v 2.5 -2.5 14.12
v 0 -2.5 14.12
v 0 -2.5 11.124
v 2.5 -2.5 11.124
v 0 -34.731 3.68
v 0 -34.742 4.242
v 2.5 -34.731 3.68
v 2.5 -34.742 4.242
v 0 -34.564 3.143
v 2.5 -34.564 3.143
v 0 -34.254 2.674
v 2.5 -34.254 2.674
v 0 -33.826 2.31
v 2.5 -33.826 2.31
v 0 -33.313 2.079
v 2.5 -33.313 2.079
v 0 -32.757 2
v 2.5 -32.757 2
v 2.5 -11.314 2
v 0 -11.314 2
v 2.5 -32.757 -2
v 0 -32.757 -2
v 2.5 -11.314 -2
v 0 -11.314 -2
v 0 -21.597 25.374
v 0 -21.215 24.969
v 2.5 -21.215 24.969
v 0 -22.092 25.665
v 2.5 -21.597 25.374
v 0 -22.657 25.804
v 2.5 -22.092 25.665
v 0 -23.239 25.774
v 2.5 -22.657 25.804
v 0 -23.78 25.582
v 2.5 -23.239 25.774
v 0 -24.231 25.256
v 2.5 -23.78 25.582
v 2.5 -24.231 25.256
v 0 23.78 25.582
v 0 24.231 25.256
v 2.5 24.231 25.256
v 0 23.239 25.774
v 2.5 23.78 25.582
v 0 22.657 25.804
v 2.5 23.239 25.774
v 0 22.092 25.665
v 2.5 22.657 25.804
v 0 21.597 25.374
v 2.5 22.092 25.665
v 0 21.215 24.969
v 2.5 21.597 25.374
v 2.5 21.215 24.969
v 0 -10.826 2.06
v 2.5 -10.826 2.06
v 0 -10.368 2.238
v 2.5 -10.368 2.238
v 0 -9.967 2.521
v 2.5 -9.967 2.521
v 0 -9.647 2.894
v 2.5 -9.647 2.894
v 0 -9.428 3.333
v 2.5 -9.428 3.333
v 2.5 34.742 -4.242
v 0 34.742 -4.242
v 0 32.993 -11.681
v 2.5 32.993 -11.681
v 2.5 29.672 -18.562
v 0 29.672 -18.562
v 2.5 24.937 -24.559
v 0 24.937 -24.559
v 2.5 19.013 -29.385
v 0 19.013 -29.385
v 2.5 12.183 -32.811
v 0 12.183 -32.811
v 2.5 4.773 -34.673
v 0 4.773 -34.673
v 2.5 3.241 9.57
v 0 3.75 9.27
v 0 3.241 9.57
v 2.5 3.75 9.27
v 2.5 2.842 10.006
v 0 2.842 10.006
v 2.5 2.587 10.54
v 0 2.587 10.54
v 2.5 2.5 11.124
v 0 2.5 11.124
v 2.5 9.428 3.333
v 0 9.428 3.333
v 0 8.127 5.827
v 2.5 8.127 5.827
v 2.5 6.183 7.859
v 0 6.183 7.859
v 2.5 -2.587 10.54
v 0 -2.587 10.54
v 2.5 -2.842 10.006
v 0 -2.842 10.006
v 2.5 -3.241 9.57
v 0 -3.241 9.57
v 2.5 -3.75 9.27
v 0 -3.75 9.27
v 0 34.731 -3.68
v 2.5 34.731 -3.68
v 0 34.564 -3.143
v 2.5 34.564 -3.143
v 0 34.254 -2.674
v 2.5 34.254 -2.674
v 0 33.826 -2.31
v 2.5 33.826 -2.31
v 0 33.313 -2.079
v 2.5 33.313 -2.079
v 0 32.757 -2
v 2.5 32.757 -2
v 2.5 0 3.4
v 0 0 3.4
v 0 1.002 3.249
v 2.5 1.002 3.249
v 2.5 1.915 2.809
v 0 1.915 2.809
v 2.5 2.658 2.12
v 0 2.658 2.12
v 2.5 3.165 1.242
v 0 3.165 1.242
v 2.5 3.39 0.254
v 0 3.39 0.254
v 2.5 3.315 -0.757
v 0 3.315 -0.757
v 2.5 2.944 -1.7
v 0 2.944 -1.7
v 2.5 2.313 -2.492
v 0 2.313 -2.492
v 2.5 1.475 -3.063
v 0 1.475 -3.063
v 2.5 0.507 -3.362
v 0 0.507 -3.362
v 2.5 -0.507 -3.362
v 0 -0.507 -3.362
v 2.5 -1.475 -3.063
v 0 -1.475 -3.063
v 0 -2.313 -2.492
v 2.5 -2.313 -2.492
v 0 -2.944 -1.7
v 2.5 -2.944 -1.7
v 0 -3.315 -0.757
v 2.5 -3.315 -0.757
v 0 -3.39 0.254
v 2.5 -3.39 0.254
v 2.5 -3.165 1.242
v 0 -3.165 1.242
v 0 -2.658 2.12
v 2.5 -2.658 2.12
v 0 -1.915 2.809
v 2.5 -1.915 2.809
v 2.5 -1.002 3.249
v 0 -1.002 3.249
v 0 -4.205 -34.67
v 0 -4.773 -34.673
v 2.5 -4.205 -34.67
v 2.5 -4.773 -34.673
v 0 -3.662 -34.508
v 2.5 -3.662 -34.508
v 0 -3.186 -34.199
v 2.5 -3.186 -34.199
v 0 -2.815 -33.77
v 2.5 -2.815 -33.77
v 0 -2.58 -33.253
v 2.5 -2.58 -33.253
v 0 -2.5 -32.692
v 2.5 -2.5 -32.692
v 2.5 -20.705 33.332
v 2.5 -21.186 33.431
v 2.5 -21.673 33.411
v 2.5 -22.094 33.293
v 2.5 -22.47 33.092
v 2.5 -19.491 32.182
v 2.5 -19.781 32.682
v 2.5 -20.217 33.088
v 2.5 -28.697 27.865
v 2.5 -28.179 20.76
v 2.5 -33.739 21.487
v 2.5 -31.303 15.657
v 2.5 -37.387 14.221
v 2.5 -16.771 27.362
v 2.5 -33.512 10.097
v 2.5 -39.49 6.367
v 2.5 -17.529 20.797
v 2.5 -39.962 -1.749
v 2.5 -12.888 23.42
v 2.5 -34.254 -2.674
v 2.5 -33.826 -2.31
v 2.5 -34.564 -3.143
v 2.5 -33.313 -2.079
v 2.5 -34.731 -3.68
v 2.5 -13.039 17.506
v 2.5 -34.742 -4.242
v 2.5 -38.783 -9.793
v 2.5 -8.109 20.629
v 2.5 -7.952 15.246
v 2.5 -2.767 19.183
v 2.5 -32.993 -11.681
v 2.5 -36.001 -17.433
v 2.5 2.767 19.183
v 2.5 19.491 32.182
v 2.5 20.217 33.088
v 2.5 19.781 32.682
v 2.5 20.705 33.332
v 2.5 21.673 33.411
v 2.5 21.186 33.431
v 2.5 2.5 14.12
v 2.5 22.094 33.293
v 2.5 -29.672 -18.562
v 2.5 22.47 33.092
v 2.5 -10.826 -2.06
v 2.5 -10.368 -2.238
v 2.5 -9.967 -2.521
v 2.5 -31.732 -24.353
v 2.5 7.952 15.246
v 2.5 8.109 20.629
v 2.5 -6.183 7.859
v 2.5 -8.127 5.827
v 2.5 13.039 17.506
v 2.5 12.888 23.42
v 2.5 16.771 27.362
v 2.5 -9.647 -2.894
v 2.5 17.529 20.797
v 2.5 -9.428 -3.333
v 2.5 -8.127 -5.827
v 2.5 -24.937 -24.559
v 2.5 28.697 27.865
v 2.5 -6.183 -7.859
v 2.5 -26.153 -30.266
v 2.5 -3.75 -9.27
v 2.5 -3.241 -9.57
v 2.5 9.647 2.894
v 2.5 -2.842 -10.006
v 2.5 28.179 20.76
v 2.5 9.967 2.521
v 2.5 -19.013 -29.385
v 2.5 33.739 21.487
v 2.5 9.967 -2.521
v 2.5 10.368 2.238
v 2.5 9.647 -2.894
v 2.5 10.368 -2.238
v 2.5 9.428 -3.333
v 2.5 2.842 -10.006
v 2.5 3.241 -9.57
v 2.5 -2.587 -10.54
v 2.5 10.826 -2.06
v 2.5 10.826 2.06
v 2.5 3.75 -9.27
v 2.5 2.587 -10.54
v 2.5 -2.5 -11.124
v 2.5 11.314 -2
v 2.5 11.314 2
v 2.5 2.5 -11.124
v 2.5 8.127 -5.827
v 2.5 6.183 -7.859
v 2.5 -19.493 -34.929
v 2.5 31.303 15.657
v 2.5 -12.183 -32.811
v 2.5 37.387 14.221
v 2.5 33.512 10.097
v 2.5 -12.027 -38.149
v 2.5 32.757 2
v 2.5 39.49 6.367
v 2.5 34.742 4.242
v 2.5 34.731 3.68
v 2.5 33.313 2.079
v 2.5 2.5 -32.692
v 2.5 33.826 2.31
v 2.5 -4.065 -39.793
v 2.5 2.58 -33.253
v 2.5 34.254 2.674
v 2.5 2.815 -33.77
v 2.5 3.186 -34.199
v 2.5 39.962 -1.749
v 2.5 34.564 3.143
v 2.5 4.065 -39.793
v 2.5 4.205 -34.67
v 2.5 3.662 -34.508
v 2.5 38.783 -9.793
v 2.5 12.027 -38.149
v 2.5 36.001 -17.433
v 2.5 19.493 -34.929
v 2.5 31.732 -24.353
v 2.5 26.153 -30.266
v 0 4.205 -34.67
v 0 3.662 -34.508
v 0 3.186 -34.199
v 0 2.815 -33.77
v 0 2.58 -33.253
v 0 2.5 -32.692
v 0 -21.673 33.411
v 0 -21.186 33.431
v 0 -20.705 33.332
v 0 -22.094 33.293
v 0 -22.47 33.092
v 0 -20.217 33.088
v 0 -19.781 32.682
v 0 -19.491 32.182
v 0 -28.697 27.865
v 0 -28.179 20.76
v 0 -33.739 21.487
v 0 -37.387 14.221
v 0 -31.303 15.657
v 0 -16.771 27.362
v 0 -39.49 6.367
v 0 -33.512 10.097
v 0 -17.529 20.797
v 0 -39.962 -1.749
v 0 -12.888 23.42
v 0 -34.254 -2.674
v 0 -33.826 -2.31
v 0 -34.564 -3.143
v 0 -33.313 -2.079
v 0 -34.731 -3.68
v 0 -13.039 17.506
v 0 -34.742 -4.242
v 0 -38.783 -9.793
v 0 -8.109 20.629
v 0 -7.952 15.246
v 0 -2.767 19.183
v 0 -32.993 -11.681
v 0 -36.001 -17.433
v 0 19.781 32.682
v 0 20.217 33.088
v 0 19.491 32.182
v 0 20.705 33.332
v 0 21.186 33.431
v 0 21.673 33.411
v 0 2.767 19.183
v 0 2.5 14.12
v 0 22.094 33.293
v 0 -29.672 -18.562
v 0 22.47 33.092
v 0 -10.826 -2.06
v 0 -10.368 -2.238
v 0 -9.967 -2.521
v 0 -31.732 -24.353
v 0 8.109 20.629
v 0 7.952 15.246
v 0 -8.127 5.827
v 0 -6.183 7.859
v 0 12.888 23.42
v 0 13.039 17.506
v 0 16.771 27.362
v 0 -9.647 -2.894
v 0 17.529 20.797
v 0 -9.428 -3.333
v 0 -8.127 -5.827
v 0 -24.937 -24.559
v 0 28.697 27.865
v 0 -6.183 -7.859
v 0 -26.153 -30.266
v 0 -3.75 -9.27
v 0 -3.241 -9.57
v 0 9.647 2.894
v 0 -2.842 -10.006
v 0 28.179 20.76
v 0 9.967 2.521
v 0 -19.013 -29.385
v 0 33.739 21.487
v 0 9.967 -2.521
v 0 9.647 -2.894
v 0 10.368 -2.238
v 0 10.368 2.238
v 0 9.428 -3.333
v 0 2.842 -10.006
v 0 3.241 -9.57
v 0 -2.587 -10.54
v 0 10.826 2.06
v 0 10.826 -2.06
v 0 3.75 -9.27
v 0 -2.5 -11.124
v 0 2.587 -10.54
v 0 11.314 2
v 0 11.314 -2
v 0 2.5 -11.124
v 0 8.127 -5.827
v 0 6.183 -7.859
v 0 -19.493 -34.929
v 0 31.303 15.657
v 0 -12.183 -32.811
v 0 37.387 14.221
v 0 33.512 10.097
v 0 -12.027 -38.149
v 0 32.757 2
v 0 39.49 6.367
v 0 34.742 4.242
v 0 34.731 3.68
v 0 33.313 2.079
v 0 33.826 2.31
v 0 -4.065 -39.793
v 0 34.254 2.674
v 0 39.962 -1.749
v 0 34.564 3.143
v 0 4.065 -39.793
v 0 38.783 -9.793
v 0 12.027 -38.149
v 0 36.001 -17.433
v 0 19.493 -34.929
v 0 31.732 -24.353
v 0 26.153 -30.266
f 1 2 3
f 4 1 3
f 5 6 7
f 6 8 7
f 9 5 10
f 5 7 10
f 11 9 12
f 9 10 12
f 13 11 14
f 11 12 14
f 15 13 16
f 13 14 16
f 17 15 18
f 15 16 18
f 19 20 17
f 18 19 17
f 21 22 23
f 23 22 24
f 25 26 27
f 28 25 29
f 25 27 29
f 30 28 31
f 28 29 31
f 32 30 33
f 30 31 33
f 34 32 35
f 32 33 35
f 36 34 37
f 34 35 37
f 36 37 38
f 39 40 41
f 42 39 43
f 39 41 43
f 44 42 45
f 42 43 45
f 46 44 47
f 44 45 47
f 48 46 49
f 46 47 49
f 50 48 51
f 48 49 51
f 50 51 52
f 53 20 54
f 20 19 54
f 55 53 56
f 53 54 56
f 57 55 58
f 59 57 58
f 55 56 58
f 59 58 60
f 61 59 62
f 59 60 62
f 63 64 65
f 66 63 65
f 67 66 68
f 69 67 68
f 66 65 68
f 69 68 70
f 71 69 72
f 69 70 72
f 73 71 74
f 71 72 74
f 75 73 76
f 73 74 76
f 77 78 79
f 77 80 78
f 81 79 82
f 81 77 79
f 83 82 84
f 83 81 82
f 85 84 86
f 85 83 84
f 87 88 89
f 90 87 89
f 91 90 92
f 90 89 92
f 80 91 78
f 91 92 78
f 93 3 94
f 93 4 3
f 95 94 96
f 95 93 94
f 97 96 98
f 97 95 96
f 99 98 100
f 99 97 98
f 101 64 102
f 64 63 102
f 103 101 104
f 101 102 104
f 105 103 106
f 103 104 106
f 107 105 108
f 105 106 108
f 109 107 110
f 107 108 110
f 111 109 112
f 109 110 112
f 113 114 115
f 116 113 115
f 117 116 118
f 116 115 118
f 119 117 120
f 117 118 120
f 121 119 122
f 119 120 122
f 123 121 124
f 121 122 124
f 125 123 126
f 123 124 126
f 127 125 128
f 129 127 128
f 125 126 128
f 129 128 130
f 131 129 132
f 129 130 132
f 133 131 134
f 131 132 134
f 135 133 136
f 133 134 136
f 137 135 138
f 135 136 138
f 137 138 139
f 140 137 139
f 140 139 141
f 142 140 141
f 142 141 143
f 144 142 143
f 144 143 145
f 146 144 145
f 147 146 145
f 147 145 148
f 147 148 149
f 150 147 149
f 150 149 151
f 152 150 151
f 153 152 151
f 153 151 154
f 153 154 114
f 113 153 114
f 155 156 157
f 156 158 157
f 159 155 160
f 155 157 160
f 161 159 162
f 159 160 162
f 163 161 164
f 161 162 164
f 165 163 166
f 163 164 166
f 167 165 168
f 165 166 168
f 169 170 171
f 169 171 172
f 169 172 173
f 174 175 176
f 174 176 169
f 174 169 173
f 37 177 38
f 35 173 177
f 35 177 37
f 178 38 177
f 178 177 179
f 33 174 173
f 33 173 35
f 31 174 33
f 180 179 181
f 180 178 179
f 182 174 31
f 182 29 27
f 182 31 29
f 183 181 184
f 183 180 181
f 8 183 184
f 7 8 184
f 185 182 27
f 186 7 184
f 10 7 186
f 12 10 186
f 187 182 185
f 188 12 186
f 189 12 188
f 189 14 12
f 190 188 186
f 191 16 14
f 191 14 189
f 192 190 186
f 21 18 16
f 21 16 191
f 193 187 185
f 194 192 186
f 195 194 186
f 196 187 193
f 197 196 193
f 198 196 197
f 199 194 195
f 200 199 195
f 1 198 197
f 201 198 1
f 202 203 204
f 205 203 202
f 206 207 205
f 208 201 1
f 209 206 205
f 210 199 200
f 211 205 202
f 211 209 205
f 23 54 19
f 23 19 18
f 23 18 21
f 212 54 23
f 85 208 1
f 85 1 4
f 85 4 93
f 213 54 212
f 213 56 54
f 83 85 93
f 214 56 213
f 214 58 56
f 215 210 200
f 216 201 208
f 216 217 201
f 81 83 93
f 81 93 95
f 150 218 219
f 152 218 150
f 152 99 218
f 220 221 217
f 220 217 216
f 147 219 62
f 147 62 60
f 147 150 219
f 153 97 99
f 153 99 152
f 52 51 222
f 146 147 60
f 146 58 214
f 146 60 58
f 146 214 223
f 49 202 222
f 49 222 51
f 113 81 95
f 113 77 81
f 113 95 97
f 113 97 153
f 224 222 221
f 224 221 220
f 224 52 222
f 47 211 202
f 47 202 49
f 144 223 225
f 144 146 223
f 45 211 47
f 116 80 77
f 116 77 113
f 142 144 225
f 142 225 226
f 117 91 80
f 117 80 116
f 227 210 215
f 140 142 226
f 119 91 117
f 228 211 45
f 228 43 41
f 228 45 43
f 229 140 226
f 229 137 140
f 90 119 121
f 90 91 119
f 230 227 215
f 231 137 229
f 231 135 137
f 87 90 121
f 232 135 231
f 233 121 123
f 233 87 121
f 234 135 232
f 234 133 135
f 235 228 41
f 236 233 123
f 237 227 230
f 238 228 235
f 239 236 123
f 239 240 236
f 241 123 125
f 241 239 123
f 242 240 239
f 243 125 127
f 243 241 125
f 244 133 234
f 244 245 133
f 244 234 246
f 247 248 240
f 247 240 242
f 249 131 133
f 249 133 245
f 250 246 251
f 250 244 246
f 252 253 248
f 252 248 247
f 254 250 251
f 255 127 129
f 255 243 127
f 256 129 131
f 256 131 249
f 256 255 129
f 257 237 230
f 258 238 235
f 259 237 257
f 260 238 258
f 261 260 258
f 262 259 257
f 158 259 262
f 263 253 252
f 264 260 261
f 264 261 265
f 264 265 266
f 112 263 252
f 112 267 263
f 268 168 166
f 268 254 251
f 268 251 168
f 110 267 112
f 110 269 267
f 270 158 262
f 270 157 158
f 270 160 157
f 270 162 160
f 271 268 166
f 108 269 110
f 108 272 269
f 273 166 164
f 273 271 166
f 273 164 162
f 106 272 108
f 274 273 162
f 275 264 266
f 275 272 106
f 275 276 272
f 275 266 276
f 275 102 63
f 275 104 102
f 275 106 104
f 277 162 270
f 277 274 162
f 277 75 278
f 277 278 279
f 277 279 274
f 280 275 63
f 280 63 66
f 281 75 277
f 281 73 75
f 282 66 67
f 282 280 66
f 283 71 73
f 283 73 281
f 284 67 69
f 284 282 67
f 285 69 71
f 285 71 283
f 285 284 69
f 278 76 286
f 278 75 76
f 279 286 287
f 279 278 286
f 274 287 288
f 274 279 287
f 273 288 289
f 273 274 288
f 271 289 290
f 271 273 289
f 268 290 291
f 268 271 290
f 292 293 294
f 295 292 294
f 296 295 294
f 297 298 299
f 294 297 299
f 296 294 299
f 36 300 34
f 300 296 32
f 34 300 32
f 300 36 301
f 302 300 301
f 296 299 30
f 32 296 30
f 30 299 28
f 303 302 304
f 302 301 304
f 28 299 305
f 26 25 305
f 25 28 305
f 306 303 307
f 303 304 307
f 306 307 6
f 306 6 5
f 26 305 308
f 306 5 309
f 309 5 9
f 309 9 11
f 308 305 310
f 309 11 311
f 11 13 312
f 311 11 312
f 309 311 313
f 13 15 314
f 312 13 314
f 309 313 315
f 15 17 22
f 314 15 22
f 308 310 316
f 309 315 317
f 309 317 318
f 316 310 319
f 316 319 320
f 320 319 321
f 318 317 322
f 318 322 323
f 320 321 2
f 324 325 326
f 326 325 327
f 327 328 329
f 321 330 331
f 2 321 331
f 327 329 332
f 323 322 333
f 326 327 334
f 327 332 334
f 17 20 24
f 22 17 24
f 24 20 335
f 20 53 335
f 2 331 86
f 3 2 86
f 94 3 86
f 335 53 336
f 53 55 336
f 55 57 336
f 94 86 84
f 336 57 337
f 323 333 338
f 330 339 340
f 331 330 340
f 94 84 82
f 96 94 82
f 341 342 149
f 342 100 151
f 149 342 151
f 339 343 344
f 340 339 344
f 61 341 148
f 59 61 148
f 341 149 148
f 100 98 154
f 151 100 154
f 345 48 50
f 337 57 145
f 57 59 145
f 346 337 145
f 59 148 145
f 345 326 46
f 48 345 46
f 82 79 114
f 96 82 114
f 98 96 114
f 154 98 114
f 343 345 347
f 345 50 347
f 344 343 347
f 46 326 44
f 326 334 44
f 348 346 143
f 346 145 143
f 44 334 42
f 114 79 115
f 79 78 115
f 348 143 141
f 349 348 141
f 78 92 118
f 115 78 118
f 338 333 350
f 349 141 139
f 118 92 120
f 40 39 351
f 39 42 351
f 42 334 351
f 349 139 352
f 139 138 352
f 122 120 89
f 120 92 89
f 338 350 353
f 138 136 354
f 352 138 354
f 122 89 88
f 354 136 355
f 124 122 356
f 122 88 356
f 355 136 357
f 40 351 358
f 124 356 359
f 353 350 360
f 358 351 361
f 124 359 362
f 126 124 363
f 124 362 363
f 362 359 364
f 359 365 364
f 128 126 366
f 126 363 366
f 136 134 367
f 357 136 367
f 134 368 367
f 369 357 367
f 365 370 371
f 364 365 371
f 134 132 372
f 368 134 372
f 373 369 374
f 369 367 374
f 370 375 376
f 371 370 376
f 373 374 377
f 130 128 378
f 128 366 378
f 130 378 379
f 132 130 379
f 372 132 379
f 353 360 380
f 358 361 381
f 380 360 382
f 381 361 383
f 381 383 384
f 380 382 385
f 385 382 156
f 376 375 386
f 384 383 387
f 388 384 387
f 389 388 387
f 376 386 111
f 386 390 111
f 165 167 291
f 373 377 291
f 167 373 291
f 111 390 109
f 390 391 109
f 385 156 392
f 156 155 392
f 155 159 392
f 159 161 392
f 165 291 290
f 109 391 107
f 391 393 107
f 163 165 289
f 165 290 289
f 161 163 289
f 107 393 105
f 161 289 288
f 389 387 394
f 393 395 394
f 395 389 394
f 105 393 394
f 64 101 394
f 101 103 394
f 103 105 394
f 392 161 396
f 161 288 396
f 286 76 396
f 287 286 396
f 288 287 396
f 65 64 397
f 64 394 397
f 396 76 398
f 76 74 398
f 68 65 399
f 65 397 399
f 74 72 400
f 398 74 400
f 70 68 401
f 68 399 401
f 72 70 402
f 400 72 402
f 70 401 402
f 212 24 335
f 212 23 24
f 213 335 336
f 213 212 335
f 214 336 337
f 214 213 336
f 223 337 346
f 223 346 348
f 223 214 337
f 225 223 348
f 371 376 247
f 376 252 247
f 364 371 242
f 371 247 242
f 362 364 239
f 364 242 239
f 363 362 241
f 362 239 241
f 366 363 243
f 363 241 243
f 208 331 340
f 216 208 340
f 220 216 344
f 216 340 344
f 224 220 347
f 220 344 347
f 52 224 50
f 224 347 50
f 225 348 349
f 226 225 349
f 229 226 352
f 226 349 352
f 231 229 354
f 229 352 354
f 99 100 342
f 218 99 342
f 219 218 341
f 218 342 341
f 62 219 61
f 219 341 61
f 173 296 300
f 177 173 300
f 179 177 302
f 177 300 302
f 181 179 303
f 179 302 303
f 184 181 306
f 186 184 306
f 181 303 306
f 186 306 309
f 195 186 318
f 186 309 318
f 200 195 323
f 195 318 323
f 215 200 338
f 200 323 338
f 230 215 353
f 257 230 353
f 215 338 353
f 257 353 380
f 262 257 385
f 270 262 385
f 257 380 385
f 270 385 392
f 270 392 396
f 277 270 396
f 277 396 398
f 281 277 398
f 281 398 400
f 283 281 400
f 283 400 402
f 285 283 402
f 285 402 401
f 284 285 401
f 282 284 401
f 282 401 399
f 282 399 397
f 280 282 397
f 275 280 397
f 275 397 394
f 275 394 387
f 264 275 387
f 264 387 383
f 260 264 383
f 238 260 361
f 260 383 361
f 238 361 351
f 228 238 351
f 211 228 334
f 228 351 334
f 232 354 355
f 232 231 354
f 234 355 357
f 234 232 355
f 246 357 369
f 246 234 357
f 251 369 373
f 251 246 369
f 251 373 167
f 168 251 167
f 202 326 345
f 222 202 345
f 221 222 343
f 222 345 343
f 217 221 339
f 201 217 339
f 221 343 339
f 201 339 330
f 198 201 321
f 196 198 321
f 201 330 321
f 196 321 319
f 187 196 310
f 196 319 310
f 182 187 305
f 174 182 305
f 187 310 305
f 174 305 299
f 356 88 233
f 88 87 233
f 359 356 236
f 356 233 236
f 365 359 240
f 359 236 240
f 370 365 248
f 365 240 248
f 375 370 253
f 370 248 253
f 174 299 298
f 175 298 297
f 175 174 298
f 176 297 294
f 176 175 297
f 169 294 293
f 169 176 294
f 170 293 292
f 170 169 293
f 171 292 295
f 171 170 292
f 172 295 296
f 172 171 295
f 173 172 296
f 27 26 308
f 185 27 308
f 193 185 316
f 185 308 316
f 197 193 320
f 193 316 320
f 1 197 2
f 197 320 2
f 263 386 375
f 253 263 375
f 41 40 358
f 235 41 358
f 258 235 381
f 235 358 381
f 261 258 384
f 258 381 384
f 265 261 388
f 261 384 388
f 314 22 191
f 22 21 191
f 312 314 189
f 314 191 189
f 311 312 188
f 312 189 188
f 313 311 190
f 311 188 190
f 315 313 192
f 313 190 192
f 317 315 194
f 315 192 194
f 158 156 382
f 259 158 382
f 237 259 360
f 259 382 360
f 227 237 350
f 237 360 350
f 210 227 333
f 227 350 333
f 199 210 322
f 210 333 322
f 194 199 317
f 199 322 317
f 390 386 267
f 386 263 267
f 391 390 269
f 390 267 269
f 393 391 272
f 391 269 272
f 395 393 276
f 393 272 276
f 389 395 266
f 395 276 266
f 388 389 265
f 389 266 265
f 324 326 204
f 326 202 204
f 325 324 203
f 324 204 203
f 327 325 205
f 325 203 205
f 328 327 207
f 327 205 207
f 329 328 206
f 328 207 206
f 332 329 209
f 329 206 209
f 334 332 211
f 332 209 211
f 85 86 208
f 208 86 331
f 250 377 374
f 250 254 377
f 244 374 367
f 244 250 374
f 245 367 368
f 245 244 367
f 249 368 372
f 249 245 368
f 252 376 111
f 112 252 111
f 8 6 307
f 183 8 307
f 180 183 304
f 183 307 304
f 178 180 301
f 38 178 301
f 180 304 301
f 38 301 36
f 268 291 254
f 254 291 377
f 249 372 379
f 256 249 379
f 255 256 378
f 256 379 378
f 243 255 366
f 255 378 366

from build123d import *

# Parameters (mm, degrees)
SKETCH1_R           = 1.6
BOSS_EXTRUDE1_DEPTH = 2.5
FILLET1_R           = 2
SKETCH2_R           = 3.4
CUT_EXTRUDE1_DEPTH  = 3.5000001


with BuildPart() as part:
    # Sketch1 → Boss-Extrude1 (new body)
    with BuildSketch(Plane(origin=(0, 0, 0), x_dir=(0, 0, -1), z_dir=(1, 0, 0))):
        with BuildLine():
            ThreePointArc((-34.4875, 20.263571841), (-19, 0), (-34.4875, -20.263571841))
            ThreePointArc((-34.4875, -20.263571841), (40, 0), (-34.4875, 20.263571841))
        make_face()
        with BuildLine():
            Line((-9.682458366, 2.5), (-14.120471411, 2.5))
            ThreePointArc((-14.120471411, 2.5), (-18.092232837, 14.001776242), (-26.8625, 22.436713078))
            ThreePointArc((-26.8625, 22.436713078), (-15.727733284, 31.267209753), (-2, 34.942810419))
            Line((-2, 34.942810419), (-2, 9.797958971))
            ThreePointArc((-2, 9.797958971), (-6.887307867, 7.250171746), (-9.682458366, 2.5))
        make_face(mode=Mode.SUBTRACT)
        with BuildLine():
            Line((-14.120471411, -2.5), (-9.682458366, -2.5))
            ThreePointArc((-9.682458366, -2.5), (-6.887307867, -7.250171746), (-2, -9.797958971))
            Line((-2, -9.797958971), (-2, -34.942810419))
            ThreePointArc((-2, -34.942810419), (-15.727733284, -31.267209753), (-26.8625, -22.436713078))
            ThreePointArc((-26.8625, -22.436713078), (-18.092232837, -14.001776242), (-14.120471411, -2.5))
        make_face(mode=Mode.SUBTRACT)
        with BuildLine():
            ThreePointArc((2, -9.797958971), (6.887307867, -7.250171746), (9.682458366, -2.5))
            Line((9.682458366, -2.5), (34.910600109, -2.5))
            ThreePointArc((34.910600109, -2.5), (24.570960239, -24.925246497), (2, -34.942810419))
            Line((2, -34.942810419), (2, -9.797958971))
        make_face(mode=Mode.SUBTRACT)
        with BuildLine():
            Line((34.910600109, 2.5), (9.682458366, 2.5))
            ThreePointArc((9.682458366, 2.5), (6.887307867, 7.250171746), (2, 9.797958971))
            Line((2, 9.797958971), (2, 34.942810419))
            ThreePointArc((2, 34.942810419), (24.570960239, 24.925246497), (34.910600109, 2.5))
        make_face(mode=Mode.SUBTRACT)
        Circle(SKETCH1_R, mode=Mode.SUBTRACT)
    extrude(amount=BOSS_EXTRUDE1_DEPTH)

    # Fillet1
    fillet1_edges = [part.edges().sort_by_distance(p)[0] for p in [
        (1.25, 20.263571841, 34.4875),
        (1.25, -20.263571841, 34.4875),
        (1.25, 9.797958971, 2),
        (1.25, 34.942810419, 2),
        (1.25, 22.436713078, 26.8625),
        (1.25, 2.5, 9.682458366),
        (1.25, 2.5, -34.910600109),
        (1.25, 34.942810419, -2),
        (1.25, 9.797958971, -2),
        (1.25, 2.5, -9.682458366),
        (1.25, -22.436713078, 26.8625),
        (1.25, -34.942810419, 2),
        (1.25, -9.797958971, 2),
        (1.25, -2.5, 9.682458366),
        (1.25, -9.797958971, -2),
        (1.25, -34.942810419, -2),
        (1.25, -2.5, -34.910600109),
        (1.25, -2.5, -9.682458366),
    ]]
    fillet(fillet1_edges, radius=FILLET1_R)

    # Sketch2 → Cut-Extrude1 (cut, through all)
    with BuildSketch(Plane.ZY):
        Circle(SKETCH2_R)
    extrude(amount=-CUT_EXTRUDE1_DEPTH, mode=Mode.SUBTRACT)


solid = part.part
